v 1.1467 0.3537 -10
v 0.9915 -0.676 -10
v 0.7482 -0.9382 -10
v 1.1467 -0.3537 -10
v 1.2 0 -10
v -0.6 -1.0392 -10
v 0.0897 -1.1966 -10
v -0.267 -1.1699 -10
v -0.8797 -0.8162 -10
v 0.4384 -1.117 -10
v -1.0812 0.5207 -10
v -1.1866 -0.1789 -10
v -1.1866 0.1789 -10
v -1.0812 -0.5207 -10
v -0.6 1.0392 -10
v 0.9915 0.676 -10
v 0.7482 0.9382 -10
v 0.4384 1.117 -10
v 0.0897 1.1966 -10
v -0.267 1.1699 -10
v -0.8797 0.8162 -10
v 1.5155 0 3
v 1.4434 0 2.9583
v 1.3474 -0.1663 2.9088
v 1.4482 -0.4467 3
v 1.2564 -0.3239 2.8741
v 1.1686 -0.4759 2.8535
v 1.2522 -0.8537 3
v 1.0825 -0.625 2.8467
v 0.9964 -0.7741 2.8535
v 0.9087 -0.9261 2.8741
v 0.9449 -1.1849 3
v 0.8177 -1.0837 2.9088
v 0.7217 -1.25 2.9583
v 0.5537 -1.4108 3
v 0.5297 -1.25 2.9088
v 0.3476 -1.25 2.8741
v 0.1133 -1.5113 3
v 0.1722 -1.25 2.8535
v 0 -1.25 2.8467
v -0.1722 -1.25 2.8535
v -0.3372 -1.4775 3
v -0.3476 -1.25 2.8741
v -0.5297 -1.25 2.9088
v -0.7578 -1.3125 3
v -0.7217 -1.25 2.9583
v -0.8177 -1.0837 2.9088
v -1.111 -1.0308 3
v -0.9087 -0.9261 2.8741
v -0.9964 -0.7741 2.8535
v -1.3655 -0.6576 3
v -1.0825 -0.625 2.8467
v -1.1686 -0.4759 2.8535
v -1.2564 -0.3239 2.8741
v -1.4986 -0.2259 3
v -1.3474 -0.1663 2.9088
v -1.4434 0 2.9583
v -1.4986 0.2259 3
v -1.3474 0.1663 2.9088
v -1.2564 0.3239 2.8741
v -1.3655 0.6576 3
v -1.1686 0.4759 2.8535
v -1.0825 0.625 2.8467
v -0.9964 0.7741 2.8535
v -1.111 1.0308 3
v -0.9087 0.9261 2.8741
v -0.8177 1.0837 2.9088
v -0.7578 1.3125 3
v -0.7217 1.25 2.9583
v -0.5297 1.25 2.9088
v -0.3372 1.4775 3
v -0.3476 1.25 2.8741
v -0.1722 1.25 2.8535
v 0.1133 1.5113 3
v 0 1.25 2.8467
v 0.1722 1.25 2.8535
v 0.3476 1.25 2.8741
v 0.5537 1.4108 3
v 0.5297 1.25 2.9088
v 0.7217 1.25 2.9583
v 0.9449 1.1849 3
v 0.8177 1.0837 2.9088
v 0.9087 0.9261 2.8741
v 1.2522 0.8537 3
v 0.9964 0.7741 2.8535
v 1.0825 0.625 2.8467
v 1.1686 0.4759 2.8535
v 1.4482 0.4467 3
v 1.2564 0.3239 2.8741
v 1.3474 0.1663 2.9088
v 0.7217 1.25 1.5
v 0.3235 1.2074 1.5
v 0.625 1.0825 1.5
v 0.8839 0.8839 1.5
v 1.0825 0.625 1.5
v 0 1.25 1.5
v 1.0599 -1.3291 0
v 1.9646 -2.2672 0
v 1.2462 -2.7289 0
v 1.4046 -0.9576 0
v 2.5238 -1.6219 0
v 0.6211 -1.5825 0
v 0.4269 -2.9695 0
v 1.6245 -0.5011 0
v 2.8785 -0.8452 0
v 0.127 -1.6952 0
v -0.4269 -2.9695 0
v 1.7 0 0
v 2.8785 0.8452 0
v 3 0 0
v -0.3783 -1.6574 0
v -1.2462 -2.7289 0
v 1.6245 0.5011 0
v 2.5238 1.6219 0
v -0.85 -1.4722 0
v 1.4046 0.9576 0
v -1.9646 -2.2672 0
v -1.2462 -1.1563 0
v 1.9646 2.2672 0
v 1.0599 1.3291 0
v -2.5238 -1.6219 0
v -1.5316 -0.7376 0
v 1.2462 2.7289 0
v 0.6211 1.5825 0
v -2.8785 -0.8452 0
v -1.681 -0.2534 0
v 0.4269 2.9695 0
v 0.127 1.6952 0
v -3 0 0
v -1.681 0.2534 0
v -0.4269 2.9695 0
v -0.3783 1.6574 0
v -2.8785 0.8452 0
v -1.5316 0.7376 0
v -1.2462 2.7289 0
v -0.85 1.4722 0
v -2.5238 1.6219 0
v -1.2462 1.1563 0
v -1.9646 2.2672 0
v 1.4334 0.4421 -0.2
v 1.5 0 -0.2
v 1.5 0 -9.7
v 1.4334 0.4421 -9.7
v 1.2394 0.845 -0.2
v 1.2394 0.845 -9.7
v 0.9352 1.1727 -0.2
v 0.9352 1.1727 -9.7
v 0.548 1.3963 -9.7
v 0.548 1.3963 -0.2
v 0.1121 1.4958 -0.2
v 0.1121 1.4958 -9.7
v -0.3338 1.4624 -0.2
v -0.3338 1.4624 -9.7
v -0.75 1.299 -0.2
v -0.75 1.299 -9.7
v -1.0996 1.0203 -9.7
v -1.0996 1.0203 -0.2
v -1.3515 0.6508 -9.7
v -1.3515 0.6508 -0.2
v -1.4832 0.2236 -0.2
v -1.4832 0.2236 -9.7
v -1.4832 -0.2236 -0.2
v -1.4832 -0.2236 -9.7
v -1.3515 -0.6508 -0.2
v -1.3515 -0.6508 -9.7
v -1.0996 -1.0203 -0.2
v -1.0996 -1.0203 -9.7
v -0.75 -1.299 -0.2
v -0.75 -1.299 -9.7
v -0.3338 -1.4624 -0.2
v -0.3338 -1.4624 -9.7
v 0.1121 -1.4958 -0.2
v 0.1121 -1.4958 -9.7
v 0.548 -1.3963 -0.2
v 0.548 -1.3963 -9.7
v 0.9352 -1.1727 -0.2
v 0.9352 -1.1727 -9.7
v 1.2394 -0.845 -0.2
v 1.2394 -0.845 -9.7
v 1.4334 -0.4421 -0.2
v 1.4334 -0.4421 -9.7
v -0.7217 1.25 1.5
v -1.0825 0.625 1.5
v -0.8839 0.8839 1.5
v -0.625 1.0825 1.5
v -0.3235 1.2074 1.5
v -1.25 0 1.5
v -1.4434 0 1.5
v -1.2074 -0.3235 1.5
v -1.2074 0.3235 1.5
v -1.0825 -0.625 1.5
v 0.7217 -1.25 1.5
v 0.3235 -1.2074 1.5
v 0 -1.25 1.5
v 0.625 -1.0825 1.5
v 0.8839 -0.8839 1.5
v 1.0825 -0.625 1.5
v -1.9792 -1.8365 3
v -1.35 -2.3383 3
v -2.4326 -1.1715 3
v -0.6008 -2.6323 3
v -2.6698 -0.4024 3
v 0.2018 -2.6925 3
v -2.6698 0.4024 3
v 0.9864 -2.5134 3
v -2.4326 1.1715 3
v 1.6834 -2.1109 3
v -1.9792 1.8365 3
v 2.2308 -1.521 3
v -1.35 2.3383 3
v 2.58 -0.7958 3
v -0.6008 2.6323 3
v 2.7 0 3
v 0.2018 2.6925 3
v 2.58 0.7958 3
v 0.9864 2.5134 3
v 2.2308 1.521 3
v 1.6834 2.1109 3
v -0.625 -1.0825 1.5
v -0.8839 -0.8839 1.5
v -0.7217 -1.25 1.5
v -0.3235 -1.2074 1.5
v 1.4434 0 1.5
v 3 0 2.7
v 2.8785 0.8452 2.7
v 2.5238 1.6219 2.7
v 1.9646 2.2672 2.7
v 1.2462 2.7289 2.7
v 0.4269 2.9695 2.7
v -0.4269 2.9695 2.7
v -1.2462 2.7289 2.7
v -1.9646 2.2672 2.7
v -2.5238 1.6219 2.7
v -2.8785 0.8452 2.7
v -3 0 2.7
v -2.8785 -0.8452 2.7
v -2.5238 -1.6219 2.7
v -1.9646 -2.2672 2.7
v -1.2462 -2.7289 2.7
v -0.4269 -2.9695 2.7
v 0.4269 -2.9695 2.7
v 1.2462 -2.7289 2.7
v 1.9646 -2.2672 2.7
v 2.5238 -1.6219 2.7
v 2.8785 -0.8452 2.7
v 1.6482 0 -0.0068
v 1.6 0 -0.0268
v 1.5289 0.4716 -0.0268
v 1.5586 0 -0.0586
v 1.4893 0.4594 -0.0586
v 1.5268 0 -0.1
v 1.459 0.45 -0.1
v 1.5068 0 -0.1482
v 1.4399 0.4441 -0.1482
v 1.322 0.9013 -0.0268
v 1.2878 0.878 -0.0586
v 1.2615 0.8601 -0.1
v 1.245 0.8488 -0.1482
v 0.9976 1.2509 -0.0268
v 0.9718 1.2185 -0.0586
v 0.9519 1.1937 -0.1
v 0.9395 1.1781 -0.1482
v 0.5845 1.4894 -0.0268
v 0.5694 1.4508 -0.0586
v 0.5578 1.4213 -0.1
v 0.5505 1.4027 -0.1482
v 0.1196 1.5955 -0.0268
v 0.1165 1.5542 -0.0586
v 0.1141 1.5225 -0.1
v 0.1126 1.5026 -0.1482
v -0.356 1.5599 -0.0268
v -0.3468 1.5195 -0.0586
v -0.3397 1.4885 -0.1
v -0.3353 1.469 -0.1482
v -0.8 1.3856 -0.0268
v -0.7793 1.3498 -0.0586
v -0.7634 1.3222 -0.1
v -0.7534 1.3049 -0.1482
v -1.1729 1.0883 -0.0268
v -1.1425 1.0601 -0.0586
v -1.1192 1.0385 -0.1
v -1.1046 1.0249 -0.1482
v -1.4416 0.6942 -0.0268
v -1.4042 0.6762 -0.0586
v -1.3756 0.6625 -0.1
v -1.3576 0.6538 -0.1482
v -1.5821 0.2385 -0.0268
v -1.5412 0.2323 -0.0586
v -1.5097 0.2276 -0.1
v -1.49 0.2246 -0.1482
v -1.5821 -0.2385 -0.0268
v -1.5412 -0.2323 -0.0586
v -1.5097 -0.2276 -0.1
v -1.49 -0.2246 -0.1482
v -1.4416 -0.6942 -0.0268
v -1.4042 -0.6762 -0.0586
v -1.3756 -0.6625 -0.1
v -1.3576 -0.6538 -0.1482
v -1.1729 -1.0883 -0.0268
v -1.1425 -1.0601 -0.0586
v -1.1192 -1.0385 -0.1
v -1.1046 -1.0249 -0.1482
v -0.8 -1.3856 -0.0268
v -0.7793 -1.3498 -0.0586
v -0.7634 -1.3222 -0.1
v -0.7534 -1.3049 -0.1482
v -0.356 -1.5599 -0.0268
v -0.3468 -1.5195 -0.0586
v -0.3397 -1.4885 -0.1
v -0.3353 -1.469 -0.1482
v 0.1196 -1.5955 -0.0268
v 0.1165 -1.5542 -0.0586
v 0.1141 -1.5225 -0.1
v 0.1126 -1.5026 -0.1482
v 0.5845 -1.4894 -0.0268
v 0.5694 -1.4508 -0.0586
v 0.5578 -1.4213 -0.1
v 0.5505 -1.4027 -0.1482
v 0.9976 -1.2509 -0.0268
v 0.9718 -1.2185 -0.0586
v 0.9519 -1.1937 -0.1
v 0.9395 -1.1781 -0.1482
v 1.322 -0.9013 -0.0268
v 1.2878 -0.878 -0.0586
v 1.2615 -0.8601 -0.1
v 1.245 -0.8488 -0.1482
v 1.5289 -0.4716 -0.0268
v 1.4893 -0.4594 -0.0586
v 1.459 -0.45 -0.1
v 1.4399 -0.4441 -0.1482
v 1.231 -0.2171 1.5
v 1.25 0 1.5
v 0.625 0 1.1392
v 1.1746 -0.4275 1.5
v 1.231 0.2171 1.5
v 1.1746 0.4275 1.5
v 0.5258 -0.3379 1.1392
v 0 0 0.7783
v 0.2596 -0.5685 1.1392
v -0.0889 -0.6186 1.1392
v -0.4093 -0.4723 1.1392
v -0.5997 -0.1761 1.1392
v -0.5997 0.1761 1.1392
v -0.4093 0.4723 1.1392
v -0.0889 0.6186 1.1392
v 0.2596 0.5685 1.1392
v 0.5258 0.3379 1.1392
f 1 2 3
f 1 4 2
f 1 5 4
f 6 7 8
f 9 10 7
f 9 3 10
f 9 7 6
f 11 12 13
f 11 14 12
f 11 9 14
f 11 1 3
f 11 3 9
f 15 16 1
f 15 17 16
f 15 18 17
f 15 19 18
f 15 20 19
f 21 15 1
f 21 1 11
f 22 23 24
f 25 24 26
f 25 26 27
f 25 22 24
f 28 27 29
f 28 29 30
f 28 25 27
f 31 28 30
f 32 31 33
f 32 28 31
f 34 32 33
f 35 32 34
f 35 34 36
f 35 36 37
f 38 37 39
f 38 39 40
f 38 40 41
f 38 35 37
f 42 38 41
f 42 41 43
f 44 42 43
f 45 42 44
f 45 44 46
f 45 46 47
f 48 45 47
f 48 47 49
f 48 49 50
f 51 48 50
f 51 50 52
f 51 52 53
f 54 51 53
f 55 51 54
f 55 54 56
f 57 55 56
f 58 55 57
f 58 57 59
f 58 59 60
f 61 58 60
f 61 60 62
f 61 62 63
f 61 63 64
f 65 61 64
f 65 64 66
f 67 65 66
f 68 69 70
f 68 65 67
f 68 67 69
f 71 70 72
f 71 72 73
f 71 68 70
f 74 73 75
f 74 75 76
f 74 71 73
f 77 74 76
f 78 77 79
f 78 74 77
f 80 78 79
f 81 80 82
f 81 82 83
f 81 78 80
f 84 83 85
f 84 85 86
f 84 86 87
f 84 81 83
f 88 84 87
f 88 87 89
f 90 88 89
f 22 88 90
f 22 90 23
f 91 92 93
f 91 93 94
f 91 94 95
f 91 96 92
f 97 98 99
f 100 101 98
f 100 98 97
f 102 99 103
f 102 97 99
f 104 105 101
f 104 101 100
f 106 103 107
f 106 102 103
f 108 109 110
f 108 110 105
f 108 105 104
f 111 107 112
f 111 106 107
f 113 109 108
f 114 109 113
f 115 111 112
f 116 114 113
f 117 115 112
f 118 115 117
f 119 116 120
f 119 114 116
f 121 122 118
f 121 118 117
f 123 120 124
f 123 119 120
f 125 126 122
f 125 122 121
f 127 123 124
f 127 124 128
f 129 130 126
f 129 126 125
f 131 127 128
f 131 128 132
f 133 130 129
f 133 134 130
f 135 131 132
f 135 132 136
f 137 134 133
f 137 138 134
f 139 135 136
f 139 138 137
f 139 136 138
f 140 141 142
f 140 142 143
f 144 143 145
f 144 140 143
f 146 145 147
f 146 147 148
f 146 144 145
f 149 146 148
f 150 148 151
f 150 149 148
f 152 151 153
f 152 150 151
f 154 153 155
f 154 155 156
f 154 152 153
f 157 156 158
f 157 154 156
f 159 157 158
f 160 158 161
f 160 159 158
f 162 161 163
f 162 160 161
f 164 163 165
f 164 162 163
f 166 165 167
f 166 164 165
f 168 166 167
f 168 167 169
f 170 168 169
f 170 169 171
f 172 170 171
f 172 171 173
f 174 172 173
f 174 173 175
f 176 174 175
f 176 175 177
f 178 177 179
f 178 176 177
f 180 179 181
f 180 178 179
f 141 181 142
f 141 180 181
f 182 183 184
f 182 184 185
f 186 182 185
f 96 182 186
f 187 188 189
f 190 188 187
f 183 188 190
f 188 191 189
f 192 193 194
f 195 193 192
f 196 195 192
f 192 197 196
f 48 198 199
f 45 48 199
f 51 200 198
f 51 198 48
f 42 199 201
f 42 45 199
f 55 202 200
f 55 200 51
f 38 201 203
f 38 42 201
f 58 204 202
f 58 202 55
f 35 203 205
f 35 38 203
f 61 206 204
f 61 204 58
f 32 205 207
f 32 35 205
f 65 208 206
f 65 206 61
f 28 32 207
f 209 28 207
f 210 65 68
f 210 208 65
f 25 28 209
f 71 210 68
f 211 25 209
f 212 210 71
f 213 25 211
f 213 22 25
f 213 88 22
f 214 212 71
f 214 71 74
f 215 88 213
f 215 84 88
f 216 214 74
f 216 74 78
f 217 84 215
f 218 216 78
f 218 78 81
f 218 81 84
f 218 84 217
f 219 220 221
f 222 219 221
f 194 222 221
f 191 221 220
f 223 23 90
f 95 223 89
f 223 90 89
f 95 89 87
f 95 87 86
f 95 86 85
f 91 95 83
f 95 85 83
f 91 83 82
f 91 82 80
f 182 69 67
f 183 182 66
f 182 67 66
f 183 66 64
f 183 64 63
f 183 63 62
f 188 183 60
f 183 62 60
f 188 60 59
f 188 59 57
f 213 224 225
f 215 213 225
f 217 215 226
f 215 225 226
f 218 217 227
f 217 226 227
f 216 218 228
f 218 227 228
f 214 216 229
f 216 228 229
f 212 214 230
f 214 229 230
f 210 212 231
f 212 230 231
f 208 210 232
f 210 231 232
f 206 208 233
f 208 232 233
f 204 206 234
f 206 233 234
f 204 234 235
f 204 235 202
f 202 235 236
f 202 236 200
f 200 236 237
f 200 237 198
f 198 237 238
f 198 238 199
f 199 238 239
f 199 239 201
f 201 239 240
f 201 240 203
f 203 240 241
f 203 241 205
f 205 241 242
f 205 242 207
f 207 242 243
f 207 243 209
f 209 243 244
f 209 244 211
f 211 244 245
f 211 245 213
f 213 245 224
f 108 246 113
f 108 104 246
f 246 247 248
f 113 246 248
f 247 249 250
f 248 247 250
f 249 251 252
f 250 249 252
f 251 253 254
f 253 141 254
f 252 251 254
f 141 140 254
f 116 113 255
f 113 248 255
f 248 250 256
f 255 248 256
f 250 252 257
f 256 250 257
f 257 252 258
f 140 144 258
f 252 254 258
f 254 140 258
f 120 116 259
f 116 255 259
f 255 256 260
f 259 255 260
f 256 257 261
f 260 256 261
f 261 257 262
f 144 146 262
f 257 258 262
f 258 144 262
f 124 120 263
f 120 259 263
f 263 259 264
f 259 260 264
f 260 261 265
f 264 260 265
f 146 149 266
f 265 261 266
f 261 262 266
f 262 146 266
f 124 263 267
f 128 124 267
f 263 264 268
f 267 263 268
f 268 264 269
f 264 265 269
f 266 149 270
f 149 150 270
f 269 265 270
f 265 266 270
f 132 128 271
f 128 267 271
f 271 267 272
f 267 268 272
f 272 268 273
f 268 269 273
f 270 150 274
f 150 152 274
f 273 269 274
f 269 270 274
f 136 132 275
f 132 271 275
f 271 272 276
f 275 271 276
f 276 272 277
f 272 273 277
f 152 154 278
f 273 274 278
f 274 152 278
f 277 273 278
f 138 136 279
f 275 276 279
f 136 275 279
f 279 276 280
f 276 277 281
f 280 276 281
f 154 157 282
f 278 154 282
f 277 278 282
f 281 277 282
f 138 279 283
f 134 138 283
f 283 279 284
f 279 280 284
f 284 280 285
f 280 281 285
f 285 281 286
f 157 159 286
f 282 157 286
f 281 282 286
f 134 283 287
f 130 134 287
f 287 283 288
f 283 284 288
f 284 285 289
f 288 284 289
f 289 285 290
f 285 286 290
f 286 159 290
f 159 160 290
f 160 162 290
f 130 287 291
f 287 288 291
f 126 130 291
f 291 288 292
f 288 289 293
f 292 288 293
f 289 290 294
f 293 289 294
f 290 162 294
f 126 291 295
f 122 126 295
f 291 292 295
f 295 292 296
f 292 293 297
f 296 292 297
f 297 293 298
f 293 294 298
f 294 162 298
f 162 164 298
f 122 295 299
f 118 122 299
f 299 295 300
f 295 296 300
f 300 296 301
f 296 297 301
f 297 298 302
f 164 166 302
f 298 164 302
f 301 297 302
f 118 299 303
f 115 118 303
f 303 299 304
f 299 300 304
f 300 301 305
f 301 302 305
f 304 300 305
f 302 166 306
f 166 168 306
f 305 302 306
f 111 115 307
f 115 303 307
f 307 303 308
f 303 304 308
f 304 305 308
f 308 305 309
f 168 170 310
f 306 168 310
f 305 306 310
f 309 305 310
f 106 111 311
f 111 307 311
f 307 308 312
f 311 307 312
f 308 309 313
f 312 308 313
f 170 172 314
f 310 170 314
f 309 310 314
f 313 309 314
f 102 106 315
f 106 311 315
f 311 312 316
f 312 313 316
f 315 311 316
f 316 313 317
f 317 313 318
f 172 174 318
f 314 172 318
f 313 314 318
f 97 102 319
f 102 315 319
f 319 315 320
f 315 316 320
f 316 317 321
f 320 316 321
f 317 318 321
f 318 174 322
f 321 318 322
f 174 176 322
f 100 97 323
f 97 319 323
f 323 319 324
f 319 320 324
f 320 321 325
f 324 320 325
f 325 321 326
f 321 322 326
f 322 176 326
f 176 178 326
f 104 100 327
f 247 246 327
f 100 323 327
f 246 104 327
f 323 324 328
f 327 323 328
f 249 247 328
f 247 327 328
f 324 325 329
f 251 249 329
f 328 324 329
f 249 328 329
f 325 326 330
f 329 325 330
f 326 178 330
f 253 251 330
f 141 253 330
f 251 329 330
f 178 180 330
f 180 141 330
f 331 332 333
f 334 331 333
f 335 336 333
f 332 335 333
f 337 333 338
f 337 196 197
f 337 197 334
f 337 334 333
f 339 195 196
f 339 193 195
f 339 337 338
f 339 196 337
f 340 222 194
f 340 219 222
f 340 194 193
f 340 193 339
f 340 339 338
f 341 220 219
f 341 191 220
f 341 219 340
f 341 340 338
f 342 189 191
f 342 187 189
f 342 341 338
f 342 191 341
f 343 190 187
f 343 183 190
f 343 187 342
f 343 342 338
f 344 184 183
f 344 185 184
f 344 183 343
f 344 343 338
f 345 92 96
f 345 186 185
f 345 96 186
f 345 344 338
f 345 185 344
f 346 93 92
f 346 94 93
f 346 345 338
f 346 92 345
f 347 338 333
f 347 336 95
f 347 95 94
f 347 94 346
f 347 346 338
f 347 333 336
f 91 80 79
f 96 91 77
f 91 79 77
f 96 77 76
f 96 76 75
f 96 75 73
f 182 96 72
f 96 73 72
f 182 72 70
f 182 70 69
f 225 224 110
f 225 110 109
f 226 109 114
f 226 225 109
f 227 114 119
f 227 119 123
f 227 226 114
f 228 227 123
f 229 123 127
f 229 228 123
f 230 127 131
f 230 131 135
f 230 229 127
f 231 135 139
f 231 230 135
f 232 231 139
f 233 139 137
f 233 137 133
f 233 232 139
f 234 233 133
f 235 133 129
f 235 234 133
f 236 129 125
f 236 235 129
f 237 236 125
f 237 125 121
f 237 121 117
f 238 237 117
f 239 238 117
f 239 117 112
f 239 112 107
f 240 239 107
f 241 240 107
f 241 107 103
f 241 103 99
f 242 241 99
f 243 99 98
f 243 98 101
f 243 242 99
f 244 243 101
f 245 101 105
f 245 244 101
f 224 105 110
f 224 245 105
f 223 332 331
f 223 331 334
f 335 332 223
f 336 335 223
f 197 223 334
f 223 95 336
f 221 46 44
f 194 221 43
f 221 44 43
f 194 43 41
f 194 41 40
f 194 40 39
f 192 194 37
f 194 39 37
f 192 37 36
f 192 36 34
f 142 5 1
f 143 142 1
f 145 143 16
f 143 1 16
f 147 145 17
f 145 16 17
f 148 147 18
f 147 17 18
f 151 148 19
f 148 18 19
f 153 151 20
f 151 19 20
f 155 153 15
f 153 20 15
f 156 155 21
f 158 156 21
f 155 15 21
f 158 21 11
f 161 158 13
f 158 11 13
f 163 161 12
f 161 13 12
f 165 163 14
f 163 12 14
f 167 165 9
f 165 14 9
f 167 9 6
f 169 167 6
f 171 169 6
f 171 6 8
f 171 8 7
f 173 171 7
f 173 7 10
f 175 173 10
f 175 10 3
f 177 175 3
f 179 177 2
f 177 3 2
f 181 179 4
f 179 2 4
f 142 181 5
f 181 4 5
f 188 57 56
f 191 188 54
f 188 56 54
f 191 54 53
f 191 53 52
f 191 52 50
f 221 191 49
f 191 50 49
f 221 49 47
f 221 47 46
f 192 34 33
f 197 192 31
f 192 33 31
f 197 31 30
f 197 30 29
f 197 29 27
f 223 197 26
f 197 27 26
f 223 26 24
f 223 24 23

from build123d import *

# Parameters (mm, degrees)
F5_DEPTH = 1.5
F6_SIZE  = 0.3
F7_R     = 0.2


with BuildPart() as f1:
    # F0 (on Front) → F1 (revolve)
    with BuildSketch(Plane.XZ):
        Polygon((3, 3), (0, 3), (0, -10), (1.5, -10), (1.5, 0), (3, 0), align=None)
    revolve(axis=Axis((0, 0, -3.5), (0, 0, 1)))

    # F2 (on Front) → F3 (revolve, cut)
    with BuildSketch(Plane.XZ):
        Polygon((1.515544, 3), (0, 3), (0, 0.778312), (1.25, 1.5), (1.25, 2.846688), align=None)
    revolve(axis=Axis((0, 0, 1.889156), (0, 0, -1)), mode=Mode.SUBTRACT)

    # F4 (on face) → F5 (cut)
    with BuildSketch(Plane.XY.offset(3)):
        Polygon((1.443376, 0), (0.721688, 1.25), (-0.721688, 1.25), (-1.443376, 0), (-0.721688, -1.25), (0.721688, -1.25), align=None)
    extrude(amount=-F5_DEPTH, mode=Mode.SUBTRACT)

    # F6
    f6_edges = [f1.edges().sort_by_distance(p)[0] for p in [
        (-3, 0, 3),
        (-1.5, 0, -10),
    ]]
    chamfer(f6_edges, length=F6_SIZE)

    # F7
    f7_edges = [f1.edges().sort_by_distance(p)[0] for p in [
        (-1.5, 0, 0),
    ]]
    fillet(f7_edges, radius=F7_R)


solid = f1.part
